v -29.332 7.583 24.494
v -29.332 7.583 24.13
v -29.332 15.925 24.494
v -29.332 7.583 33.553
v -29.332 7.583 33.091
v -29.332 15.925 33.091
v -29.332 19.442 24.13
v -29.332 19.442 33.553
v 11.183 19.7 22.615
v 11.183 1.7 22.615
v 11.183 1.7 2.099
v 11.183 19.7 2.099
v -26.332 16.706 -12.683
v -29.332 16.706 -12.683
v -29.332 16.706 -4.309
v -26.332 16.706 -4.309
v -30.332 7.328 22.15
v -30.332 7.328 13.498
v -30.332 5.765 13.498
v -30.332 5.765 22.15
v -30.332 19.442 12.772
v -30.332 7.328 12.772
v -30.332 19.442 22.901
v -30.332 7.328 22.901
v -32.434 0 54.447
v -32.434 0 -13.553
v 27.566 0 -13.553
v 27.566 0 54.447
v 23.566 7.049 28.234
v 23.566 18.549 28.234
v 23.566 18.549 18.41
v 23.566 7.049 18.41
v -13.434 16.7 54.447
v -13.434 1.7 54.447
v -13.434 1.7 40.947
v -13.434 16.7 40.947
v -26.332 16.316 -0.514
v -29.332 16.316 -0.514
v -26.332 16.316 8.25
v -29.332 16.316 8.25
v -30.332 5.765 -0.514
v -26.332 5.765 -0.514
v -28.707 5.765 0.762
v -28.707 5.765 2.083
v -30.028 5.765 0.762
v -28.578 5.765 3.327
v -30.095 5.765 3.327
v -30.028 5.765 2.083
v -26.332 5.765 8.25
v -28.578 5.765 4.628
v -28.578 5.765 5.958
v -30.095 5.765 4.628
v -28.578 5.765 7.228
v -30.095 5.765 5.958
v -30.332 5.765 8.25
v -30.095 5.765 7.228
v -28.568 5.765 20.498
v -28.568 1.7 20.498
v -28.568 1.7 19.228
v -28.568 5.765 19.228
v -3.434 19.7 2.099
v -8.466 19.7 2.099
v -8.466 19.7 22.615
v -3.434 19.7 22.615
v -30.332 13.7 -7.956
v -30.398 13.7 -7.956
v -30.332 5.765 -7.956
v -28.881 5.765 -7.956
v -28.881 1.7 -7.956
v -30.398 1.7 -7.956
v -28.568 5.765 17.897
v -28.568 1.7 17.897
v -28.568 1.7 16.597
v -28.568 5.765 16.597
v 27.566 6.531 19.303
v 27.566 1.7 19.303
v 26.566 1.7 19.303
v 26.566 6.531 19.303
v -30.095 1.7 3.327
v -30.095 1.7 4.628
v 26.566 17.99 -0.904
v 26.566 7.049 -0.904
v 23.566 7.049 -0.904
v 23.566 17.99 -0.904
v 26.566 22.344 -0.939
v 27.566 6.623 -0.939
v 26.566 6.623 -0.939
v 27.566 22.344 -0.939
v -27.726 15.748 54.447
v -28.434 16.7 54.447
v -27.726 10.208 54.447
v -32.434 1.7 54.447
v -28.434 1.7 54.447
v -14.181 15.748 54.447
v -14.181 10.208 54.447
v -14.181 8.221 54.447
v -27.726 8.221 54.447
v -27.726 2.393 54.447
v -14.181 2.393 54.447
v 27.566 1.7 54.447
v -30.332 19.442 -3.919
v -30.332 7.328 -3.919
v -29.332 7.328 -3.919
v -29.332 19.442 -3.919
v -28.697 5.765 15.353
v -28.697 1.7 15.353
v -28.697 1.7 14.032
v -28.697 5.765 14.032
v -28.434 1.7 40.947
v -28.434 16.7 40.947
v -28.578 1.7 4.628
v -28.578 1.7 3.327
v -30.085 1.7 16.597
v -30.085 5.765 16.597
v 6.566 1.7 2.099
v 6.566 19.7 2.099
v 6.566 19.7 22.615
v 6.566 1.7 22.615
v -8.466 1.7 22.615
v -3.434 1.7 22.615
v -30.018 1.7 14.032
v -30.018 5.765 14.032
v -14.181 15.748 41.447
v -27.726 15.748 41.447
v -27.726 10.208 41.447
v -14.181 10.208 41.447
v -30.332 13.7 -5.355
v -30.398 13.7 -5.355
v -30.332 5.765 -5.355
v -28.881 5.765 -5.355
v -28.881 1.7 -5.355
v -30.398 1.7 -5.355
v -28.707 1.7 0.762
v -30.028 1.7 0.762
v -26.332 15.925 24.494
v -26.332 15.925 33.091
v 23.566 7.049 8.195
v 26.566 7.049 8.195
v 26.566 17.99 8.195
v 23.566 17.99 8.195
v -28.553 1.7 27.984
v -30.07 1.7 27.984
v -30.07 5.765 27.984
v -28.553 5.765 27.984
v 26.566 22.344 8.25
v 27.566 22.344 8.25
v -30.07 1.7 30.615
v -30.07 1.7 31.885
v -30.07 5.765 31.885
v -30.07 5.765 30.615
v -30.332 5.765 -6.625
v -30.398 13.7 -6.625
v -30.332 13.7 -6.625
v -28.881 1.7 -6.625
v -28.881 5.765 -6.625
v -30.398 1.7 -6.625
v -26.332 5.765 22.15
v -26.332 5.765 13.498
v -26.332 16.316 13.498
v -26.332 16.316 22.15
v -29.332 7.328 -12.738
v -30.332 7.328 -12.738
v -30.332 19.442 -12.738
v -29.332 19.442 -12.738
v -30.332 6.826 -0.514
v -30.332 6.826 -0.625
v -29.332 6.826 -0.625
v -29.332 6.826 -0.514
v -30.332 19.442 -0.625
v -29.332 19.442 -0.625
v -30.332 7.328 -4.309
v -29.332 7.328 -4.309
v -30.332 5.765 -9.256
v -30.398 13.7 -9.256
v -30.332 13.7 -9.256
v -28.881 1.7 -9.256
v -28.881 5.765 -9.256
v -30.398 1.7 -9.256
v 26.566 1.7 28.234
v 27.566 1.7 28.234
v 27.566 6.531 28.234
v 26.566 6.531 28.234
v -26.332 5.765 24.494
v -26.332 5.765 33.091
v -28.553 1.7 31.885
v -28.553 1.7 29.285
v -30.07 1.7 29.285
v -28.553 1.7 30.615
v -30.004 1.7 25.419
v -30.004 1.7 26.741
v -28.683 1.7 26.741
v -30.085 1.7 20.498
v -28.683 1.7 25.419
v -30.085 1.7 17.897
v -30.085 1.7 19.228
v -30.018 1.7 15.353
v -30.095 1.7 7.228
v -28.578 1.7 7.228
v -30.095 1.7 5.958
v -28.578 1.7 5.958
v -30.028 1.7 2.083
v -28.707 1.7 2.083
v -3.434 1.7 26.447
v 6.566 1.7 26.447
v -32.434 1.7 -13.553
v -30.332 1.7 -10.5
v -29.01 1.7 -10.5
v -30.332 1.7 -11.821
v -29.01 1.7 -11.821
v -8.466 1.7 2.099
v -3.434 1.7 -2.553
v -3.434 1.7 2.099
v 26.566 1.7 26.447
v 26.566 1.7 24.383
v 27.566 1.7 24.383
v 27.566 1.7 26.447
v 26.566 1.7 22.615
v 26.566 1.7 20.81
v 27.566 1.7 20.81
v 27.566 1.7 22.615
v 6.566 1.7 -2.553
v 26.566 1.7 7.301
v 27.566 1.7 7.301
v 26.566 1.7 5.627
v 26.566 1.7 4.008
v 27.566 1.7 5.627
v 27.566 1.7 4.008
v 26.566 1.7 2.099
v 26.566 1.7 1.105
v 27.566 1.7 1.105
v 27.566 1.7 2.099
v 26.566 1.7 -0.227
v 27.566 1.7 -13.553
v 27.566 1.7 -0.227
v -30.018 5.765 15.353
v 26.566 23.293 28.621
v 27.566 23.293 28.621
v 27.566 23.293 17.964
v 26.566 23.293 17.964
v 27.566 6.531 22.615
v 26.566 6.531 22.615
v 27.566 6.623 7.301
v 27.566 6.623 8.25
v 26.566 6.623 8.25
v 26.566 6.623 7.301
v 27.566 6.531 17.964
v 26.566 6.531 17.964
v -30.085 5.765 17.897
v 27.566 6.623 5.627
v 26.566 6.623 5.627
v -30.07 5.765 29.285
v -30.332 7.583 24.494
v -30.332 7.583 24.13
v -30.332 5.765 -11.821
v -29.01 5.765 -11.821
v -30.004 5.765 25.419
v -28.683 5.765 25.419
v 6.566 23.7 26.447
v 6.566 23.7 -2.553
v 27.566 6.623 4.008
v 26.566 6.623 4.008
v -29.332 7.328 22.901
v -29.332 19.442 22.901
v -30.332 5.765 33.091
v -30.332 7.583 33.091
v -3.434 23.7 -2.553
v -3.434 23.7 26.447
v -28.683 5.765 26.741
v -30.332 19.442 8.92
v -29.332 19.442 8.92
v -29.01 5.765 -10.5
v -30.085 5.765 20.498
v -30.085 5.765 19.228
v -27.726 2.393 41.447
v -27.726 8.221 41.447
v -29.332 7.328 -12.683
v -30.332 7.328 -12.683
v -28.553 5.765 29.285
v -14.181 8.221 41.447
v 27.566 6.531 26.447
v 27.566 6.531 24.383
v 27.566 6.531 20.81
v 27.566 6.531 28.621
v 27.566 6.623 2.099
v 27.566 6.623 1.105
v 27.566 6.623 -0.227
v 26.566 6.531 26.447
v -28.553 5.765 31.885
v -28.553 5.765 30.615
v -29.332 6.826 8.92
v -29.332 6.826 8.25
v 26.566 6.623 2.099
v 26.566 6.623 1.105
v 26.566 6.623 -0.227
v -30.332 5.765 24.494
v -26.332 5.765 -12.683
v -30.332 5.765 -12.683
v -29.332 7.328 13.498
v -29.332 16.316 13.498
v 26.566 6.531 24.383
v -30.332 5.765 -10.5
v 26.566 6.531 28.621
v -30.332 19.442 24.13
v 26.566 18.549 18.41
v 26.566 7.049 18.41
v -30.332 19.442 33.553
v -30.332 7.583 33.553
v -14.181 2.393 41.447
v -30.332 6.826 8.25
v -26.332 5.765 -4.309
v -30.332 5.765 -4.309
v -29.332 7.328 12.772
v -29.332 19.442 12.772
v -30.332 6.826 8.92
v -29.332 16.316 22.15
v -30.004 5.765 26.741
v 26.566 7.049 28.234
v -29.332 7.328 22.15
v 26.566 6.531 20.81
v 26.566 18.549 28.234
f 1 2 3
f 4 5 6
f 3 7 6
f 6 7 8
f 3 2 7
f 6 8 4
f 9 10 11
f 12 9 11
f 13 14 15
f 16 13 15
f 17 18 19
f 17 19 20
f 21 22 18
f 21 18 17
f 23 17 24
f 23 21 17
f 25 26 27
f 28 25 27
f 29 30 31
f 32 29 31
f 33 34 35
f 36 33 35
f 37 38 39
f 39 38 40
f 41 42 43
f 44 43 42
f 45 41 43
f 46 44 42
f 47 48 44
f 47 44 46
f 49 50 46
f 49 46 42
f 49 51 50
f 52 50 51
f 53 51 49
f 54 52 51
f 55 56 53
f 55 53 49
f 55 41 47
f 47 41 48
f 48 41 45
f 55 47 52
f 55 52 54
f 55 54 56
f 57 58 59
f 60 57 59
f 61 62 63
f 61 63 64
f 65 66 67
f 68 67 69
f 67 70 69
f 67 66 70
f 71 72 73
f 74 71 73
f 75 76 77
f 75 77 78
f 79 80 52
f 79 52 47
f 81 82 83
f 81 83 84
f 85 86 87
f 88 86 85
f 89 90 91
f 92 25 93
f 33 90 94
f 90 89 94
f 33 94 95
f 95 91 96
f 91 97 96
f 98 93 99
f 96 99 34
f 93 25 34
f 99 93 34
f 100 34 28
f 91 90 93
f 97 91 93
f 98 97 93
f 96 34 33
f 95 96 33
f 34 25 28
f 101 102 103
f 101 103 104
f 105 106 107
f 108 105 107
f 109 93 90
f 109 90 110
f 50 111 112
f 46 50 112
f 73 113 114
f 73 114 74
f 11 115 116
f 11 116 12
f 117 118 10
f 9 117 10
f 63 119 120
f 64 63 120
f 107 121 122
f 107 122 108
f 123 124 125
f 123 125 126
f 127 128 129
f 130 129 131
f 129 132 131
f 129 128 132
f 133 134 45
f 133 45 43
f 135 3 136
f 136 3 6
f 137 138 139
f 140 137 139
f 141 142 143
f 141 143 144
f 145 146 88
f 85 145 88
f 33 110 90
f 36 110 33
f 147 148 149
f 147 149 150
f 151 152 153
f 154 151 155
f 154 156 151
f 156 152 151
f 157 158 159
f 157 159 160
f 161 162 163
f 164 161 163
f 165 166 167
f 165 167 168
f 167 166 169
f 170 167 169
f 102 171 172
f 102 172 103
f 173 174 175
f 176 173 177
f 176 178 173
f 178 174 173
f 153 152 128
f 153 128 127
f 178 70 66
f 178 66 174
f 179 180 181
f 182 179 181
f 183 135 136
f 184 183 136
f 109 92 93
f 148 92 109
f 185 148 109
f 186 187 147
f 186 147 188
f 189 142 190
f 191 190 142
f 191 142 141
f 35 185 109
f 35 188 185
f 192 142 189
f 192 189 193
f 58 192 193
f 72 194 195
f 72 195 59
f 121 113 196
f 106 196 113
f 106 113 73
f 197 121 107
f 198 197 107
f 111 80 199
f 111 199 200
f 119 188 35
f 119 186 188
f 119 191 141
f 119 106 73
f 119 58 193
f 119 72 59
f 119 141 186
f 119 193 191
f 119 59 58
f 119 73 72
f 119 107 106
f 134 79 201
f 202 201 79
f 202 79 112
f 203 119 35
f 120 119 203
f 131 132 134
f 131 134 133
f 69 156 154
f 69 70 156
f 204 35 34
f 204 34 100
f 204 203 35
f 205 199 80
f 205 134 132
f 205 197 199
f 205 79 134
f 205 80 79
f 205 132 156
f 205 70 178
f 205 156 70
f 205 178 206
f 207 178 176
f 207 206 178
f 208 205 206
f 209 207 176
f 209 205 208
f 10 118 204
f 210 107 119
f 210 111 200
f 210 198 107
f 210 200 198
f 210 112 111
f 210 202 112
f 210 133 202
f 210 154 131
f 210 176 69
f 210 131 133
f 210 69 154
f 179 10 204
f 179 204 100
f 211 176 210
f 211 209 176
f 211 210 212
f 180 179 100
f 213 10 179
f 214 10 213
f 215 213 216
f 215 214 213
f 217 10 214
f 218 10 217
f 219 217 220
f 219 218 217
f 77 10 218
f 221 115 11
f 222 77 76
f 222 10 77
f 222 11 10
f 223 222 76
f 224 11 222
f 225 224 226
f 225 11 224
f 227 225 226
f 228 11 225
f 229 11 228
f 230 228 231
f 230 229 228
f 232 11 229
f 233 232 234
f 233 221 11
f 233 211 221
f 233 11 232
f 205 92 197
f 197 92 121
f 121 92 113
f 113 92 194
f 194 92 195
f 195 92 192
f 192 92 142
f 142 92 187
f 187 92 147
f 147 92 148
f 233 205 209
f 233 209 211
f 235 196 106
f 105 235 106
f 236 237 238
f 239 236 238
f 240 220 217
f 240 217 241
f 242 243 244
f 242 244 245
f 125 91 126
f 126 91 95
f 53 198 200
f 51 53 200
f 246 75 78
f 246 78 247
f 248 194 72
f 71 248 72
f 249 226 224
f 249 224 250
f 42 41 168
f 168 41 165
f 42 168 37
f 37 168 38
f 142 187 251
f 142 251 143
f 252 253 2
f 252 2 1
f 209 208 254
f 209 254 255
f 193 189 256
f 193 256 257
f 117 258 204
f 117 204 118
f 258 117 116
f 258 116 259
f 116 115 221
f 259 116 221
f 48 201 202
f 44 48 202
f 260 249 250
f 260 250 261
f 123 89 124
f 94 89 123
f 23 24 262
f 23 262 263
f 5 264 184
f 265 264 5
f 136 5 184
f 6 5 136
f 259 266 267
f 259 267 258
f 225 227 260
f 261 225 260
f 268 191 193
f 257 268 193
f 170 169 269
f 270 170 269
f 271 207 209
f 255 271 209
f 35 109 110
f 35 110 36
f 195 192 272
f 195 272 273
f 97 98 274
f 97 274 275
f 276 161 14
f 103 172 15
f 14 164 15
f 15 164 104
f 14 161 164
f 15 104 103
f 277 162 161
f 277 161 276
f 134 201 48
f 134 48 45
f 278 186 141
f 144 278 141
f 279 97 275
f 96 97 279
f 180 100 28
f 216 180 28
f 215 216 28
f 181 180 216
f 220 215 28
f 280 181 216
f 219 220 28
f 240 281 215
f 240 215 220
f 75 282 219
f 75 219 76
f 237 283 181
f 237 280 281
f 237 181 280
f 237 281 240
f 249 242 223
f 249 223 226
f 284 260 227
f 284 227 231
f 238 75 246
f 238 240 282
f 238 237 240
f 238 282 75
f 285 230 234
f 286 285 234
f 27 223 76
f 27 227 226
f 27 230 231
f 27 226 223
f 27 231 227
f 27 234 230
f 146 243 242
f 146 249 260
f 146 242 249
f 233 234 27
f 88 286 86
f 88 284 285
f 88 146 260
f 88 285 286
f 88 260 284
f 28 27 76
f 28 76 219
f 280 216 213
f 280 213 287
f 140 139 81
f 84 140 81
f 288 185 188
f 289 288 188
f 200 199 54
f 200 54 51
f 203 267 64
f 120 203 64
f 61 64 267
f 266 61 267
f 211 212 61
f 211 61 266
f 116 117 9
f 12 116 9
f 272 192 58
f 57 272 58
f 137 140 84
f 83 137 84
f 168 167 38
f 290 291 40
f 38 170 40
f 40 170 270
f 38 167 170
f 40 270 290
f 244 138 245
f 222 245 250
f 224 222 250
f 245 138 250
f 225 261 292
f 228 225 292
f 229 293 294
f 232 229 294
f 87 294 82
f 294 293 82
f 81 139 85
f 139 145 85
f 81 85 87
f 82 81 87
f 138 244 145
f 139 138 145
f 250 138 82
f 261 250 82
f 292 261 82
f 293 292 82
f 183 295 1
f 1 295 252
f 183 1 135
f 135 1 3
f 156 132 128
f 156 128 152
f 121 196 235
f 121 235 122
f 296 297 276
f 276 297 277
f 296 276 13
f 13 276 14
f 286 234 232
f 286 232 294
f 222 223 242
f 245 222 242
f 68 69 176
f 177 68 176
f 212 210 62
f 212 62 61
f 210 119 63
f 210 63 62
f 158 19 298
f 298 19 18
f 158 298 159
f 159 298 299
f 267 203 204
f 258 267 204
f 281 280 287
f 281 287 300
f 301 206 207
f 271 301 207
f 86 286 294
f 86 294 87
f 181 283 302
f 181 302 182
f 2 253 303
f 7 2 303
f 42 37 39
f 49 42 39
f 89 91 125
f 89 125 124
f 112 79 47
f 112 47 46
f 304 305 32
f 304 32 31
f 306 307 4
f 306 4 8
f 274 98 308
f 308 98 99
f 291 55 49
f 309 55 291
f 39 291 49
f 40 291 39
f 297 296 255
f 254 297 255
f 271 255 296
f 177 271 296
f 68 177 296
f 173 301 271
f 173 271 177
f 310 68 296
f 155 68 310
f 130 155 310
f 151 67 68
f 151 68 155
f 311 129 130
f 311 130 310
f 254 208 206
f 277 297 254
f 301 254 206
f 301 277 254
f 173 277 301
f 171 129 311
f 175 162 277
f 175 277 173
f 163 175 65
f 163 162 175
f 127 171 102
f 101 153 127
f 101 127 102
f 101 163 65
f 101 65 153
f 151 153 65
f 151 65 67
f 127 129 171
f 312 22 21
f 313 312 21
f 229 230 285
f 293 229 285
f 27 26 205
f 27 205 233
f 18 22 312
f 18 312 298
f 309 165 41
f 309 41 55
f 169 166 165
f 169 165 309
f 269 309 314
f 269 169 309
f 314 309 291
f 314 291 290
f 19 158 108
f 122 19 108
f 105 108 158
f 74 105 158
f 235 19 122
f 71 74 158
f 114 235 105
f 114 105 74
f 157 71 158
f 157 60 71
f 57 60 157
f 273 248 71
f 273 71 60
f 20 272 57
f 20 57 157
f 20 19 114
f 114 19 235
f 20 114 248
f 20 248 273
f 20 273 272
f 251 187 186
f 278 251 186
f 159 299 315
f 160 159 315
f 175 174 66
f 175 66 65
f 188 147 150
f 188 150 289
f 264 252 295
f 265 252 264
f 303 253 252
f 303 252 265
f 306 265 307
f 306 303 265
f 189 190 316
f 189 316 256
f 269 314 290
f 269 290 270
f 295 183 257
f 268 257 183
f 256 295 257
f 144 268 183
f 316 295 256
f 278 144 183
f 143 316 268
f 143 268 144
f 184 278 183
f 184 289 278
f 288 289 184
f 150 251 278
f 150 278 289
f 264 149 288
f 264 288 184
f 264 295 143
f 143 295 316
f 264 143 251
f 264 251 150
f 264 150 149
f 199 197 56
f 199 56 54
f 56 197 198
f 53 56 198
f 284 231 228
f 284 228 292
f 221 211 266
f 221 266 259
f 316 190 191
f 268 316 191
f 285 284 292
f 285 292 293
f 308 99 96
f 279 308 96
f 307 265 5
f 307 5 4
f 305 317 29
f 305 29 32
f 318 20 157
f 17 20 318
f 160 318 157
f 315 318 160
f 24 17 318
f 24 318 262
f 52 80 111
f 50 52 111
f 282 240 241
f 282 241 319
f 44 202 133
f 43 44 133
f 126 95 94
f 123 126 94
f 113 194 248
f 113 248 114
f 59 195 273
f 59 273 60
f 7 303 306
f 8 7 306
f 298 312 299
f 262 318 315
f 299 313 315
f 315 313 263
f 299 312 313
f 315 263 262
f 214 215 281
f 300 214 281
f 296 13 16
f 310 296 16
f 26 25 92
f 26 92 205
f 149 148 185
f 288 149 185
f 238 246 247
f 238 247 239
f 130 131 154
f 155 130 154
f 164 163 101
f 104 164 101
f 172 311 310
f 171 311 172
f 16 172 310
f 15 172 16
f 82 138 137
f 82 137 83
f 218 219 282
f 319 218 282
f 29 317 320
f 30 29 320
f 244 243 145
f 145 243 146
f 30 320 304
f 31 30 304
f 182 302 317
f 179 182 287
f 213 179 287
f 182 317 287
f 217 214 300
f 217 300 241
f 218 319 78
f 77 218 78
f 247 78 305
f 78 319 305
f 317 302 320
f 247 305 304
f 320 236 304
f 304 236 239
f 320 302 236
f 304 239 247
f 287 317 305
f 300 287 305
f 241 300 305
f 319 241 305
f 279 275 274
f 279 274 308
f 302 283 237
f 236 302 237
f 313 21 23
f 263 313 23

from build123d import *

# Parameters (mm, degrees)
SKETCH1_W             = 60
SKETCH1_H             = 68
BOSS_EXTRUDE1_DEPTH   = 1.7
SKETCH2_W             = 10
SKETCH2_H             = 29
BOSS_EXTRUDE2_DEPTH   = 22
SKETCH3_W             = 19.649144156
SKETCH3_H             = 20.516018163
BOSS_EXTRUDE3_DEPTH   = 18
SKETCH4_W             = 15
SKETCH4_H             = 13.5
BOSS_EXTRUDE4_DEPTH   = 15
SKETCH5_W             = 13.544906357
SKETCH5_H             = 5.539926829
SKETCH5_H_2           = 5.827547791
CUT_EXTRUDE2_DEPTH    = 13
SKETCH6_W             = 9.824572078
SKETCH6_H             = 11.499215045
BOSS_EXTRUDE5_DEPTH   = 4
SKETCH6_W_2           = 9.098893459
SKETCH6_H_2           = 10.941000723
BOSS_EXTRUDE5_2_DEPTH = 4
SKETCH7_W             = 1.787089801
SKETCH7_H             = 6.912356929
SKETCH7_W_2           = 1.768225957
SKETCH7_W_3           = 1.507178671
SKETCH7_W_4           = 1.674642967
SKETCH7_H_2           = 6.465785471
SKETCH7_W_5           = 1.909421345
SKETCH7_W_6           = 1.332290294
BOSS_EXTRUDE6_DEPTH   = 1
SKETCH8_W             = 10.656311419
SKETCH8_H             = 16.762617894
SKETCH8_W_2           = 9.189366045
SKETCH8_H_2           = 15.720989968
BOSS_EXTRUDE7_DEPTH   = 1
SKETCH9_W             = 1.321363234
SKETCH9_H             = 1.321363233
SKETCH9_W_2           = 1.321363233
SKETCH9_H_2           = 1.321363234
SKETCH9_W_3           = 1.517029512
SKETCH9_H_3           = 1.30031101
SKETCH9_H_4           = 1.269763662
SKETCH9_H_5           = 1.300311011
SKETCH9_W_4           = 1.517029513
BOSS_EXTRUDE8_DEPTH   = 12
SKETCH10_W            = 8.373214839
SKETCH10_H            = 10.941000724
SKETCH10_W_2          = 8.763964865
SKETCH10_H_2          = 10.550250698
SKETCH10_W_3          = 8.652322001
SKETCH10_W_4          = 8.596500568
SKETCH10_H_3          = 10.159500672
BOSS_EXTRUDE9_DEPTH   = 4
SKETCH11_W            = 8.819786297
SKETCH11_H            = 12.113250801
SKETCH11_W_2          = 9.545464917
SKETCH11_H_2          = 12.615643692
SKETCH11_W_3          = 10.129411828
SKETCH11_W_4          = 9.423101323
SKETCH11_H_3          = 11.858861387
BOSS_EXTRUDE10_DEPTH  = 1


with BuildPart() as part:
    # Sketch1 → Boss-Extrude1 (new body)
    with BuildSketch(Plane(origin=(0, 0, 0), x_dir=(1, 0, 0), z_dir=(0, 1, 0))):
        with Locations((-2.434210526, -20.447368421)):
            Rectangle(SKETCH1_W, SKETCH1_H)
    extrude(amount=BOSS_EXTRUDE1_DEPTH)

    # Sketch2 → Boss-Extrude2 (add)
    with BuildSketch(Plane(origin=(0, 1.7, 0), x_dir=(1, 0, 0), z_dir=(0, 1, 0))):
        with Locations((1.565789474, -11.947368421)):
            Rectangle(SKETCH2_W, SKETCH2_H)
    extrude(amount=BOSS_EXTRUDE2_DEPTH)

    # Sketch3 → Boss-Extrude3 (add)
    with BuildSketch(Plane(origin=(0, 1.7, 0), x_dir=(1, 0, 0), z_dir=(0, 1, 0))):
        with Locations((1.358363254, -12.356544357)):
            Rectangle(SKETCH3_W, SKETCH3_H)
    extrude(amount=BOSS_EXTRUDE3_DEPTH)

    # Sketch4 → Boss-Extrude4 (add)
    with BuildSketch(Plane(origin=(0, 1.7, 0), x_dir=(1, 0, 0), z_dir=(0, 1, 0))):
        with Locations((-20.934210526, -47.697368421)):
            Rectangle(SKETCH4_W, SKETCH4_H)
    extrude(amount=BOSS_EXTRUDE4_DEPTH)

    # Sketch5 → Cut-Extrude2 (cut)
    with BuildSketch(Plane.XY.offset(54.447368421)):
        with Locations((-20.953791583, 12.977597446)):
            Rectangle(SKETCH5_W, SKETCH5_H)
        with Locations((-20.953791583, 5.306966548)):
            Rectangle(SKETCH5_W, SKETCH5_H_2)
    extrude(amount=-CUT_EXTRUDE2_DEPTH, mode=Mode.SUBTRACT)



with BuildPart() as body_2:
    # Sketch6 → Boss-Extrude5 (new body)
    with BuildSketch(Plane(origin=(27.565789474, 0, 0), x_dir=(0, 0, -1), z_dir=(1, 0, 0))):
        with Locations((-23.322172183, 12.798964349)):
            Rectangle(SKETCH6_W, SKETCH6_H)
    extrude(amount=-BOSS_EXTRUDE5_DEPTH)


with BuildPart() as body_3:
    # Sketch6 → Boss-Extrude5 2 (new body)
    with BuildSketch(Plane(origin=(27.565789474, 0, 0), x_dir=(0, 0, -1), z_dir=(1, 0, 0))):
        with Locations((-3.645117311, 12.519857188)):
            Rectangle(SKETCH6_W_2, SKETCH6_H_2)
    extrude(amount=-BOSS_EXTRUDE5_2_DEPTH)


with BuildPart() as part_1:
    add(part.part)

    add(body_2.part)  # Boss-Extrude6 merges body 2

    add(body_3.part)  # Boss-Extrude6 merges body 3
    # Sketch7 → Boss-Extrude6 (add)
    with BuildSketch(Plane(origin=(27.565789474, 0, 0), x_dir=(0, 0, -1), z_dir=(1, 0, 0))):
        with Locations((-27.340913322, 5.156178464)):
            Rectangle(SKETCH7_W, SKETCH7_H)
        with Locations((-23.498666417, 5.156178464)):
            Rectangle(SKETCH7_W_2, SKETCH7_H)
        with Locations((-20.056618396, 5.156178464)):
            Rectangle(SKETCH7_W_3, SKETCH7_H)
        with Locations((-6.46409964, 4.932892736)):
            Rectangle(SKETCH7_W_4, SKETCH7_H_2)
        with Locations((-3.053245947, 4.932892736)):
            Rectangle(SKETCH7_W_5, SKETCH7_H_2)
        with Locations((-0.439096995, 4.932892736)):
            Rectangle(SKETCH7_W_6, SKETCH7_H_2)
    extrude(amount=-BOSS_EXTRUDE6_DEPTH)

    # Sketch8 → Boss-Extrude7 (add)
    with BuildSketch(Plane(origin=(27.565789474, 0, 0), x_dir=(0, 0, -1), z_dir=(1, 0, 0))):
        with Locations((-23.292544957, 14.912084667)):
            Rectangle(SKETCH8_W, SKETCH8_H)
        with Locations((-3.65570245, 14.483934281)):
            Rectangle(SKETCH8_W_2, SKETCH8_H_2)
    extrude(amount=-BOSS_EXTRUDE7_DEPTH)

    # Sketch9 → Boss-Extrude8 (add)
    with BuildSketch(Plane(origin=(0, 1.7, 0), x_dir=(1, 0, 0), z_dir=(0, 1, 0))):
        with Locations((-29.367713838, -1.42279795)):
            Rectangle(SKETCH9_W, SKETCH9_H)
        with Locations((-29.670931722, 11.160296109)):
            Rectangle(SKETCH9_W_2, SKETCH9_H_2)
        with Locations((-29.639547043, 8.60572197)):
            Rectangle(SKETCH9_W_3, SKETCH9_H_3)
        with Locations((-29.639547043, 5.989826275)):
            Rectangle(SKETCH9_W_3, SKETCH9_H_4)
        with Locations((-29.336329159, -3.97737209)):
            Rectangle(SKETCH9_W_3, SKETCH9_H_5)
        with Locations((-29.336329159, -6.593267784)):
            Rectangle(SKETCH9_W_3, SKETCH9_H_4)
        with Locations((-29.357446593, -14.692498665)):
            Rectangle(SKETCH9_W_2, SKETCH9_H)
        with Locations((-29.326061914, -17.247072804)):
            Rectangle(SKETCH9_W_3, SKETCH9_H_3)
        with Locations((-29.326061914, -19.862968498)):
            Rectangle(SKETCH9_W_3, SKETCH9_H_4)
        with Locations((-29.34335534, -26.079899051)):
            Rectangle(SKETCH9_W, SKETCH9_H)
        with Locations((-29.311970662, -28.63447319)):
            Rectangle(SKETCH9_W_4, SKETCH9_H_3)
        with Locations((-29.311970662, -31.250368885)):
            Rectangle(SKETCH9_W_4, SKETCH9_H_4)
    extrude(amount=BOSS_EXTRUDE8_DEPTH)

    # Sketch10 → Boss-Extrude9 (add)
    with BuildSketch(Plane.ZY.offset(30.331613338)):
        with Locations((-8.496044207, 11.235964245)):
            Rectangle(SKETCH10_W, SKETCH10_H)
        with Locations((3.86840304, 11.040589232)):
            Rectangle(SKETCH10_W_2, SKETCH10_H_2)
        with Locations((17.823761105, 11.040589232)):
            Rectangle(SKETCH10_W_3, SKETCH10_H_2)
        with Locations((28.792672544, 10.845214219)):
            Rectangle(SKETCH10_W_4, SKETCH10_H_3)
    extrude(amount=-BOSS_EXTRUDE9_DEPTH)

    # Sketch11 → Boss-Extrude10 (add)
    with BuildSketch(Plane.ZY.offset(30.331613338)):
        with Locations((-8.32857991, 13.385089388)):
            Rectangle(SKETCH11_W, SKETCH11_H)
        with Locations((4.147510201, 13.133892942)):
            Rectangle(SKETCH11_W_2, SKETCH11_H_2)
        with Locations((17.836627399, 13.385089388)):
            Rectangle(SKETCH11_W_3, SKETCH11_H)
        with Locations((28.841568651, 13.512284095)):
            Rectangle(SKETCH11_W_4, SKETCH11_H_3)
    extrude(amount=-BOSS_EXTRUDE10_DEPTH)


solid = part_1.part
